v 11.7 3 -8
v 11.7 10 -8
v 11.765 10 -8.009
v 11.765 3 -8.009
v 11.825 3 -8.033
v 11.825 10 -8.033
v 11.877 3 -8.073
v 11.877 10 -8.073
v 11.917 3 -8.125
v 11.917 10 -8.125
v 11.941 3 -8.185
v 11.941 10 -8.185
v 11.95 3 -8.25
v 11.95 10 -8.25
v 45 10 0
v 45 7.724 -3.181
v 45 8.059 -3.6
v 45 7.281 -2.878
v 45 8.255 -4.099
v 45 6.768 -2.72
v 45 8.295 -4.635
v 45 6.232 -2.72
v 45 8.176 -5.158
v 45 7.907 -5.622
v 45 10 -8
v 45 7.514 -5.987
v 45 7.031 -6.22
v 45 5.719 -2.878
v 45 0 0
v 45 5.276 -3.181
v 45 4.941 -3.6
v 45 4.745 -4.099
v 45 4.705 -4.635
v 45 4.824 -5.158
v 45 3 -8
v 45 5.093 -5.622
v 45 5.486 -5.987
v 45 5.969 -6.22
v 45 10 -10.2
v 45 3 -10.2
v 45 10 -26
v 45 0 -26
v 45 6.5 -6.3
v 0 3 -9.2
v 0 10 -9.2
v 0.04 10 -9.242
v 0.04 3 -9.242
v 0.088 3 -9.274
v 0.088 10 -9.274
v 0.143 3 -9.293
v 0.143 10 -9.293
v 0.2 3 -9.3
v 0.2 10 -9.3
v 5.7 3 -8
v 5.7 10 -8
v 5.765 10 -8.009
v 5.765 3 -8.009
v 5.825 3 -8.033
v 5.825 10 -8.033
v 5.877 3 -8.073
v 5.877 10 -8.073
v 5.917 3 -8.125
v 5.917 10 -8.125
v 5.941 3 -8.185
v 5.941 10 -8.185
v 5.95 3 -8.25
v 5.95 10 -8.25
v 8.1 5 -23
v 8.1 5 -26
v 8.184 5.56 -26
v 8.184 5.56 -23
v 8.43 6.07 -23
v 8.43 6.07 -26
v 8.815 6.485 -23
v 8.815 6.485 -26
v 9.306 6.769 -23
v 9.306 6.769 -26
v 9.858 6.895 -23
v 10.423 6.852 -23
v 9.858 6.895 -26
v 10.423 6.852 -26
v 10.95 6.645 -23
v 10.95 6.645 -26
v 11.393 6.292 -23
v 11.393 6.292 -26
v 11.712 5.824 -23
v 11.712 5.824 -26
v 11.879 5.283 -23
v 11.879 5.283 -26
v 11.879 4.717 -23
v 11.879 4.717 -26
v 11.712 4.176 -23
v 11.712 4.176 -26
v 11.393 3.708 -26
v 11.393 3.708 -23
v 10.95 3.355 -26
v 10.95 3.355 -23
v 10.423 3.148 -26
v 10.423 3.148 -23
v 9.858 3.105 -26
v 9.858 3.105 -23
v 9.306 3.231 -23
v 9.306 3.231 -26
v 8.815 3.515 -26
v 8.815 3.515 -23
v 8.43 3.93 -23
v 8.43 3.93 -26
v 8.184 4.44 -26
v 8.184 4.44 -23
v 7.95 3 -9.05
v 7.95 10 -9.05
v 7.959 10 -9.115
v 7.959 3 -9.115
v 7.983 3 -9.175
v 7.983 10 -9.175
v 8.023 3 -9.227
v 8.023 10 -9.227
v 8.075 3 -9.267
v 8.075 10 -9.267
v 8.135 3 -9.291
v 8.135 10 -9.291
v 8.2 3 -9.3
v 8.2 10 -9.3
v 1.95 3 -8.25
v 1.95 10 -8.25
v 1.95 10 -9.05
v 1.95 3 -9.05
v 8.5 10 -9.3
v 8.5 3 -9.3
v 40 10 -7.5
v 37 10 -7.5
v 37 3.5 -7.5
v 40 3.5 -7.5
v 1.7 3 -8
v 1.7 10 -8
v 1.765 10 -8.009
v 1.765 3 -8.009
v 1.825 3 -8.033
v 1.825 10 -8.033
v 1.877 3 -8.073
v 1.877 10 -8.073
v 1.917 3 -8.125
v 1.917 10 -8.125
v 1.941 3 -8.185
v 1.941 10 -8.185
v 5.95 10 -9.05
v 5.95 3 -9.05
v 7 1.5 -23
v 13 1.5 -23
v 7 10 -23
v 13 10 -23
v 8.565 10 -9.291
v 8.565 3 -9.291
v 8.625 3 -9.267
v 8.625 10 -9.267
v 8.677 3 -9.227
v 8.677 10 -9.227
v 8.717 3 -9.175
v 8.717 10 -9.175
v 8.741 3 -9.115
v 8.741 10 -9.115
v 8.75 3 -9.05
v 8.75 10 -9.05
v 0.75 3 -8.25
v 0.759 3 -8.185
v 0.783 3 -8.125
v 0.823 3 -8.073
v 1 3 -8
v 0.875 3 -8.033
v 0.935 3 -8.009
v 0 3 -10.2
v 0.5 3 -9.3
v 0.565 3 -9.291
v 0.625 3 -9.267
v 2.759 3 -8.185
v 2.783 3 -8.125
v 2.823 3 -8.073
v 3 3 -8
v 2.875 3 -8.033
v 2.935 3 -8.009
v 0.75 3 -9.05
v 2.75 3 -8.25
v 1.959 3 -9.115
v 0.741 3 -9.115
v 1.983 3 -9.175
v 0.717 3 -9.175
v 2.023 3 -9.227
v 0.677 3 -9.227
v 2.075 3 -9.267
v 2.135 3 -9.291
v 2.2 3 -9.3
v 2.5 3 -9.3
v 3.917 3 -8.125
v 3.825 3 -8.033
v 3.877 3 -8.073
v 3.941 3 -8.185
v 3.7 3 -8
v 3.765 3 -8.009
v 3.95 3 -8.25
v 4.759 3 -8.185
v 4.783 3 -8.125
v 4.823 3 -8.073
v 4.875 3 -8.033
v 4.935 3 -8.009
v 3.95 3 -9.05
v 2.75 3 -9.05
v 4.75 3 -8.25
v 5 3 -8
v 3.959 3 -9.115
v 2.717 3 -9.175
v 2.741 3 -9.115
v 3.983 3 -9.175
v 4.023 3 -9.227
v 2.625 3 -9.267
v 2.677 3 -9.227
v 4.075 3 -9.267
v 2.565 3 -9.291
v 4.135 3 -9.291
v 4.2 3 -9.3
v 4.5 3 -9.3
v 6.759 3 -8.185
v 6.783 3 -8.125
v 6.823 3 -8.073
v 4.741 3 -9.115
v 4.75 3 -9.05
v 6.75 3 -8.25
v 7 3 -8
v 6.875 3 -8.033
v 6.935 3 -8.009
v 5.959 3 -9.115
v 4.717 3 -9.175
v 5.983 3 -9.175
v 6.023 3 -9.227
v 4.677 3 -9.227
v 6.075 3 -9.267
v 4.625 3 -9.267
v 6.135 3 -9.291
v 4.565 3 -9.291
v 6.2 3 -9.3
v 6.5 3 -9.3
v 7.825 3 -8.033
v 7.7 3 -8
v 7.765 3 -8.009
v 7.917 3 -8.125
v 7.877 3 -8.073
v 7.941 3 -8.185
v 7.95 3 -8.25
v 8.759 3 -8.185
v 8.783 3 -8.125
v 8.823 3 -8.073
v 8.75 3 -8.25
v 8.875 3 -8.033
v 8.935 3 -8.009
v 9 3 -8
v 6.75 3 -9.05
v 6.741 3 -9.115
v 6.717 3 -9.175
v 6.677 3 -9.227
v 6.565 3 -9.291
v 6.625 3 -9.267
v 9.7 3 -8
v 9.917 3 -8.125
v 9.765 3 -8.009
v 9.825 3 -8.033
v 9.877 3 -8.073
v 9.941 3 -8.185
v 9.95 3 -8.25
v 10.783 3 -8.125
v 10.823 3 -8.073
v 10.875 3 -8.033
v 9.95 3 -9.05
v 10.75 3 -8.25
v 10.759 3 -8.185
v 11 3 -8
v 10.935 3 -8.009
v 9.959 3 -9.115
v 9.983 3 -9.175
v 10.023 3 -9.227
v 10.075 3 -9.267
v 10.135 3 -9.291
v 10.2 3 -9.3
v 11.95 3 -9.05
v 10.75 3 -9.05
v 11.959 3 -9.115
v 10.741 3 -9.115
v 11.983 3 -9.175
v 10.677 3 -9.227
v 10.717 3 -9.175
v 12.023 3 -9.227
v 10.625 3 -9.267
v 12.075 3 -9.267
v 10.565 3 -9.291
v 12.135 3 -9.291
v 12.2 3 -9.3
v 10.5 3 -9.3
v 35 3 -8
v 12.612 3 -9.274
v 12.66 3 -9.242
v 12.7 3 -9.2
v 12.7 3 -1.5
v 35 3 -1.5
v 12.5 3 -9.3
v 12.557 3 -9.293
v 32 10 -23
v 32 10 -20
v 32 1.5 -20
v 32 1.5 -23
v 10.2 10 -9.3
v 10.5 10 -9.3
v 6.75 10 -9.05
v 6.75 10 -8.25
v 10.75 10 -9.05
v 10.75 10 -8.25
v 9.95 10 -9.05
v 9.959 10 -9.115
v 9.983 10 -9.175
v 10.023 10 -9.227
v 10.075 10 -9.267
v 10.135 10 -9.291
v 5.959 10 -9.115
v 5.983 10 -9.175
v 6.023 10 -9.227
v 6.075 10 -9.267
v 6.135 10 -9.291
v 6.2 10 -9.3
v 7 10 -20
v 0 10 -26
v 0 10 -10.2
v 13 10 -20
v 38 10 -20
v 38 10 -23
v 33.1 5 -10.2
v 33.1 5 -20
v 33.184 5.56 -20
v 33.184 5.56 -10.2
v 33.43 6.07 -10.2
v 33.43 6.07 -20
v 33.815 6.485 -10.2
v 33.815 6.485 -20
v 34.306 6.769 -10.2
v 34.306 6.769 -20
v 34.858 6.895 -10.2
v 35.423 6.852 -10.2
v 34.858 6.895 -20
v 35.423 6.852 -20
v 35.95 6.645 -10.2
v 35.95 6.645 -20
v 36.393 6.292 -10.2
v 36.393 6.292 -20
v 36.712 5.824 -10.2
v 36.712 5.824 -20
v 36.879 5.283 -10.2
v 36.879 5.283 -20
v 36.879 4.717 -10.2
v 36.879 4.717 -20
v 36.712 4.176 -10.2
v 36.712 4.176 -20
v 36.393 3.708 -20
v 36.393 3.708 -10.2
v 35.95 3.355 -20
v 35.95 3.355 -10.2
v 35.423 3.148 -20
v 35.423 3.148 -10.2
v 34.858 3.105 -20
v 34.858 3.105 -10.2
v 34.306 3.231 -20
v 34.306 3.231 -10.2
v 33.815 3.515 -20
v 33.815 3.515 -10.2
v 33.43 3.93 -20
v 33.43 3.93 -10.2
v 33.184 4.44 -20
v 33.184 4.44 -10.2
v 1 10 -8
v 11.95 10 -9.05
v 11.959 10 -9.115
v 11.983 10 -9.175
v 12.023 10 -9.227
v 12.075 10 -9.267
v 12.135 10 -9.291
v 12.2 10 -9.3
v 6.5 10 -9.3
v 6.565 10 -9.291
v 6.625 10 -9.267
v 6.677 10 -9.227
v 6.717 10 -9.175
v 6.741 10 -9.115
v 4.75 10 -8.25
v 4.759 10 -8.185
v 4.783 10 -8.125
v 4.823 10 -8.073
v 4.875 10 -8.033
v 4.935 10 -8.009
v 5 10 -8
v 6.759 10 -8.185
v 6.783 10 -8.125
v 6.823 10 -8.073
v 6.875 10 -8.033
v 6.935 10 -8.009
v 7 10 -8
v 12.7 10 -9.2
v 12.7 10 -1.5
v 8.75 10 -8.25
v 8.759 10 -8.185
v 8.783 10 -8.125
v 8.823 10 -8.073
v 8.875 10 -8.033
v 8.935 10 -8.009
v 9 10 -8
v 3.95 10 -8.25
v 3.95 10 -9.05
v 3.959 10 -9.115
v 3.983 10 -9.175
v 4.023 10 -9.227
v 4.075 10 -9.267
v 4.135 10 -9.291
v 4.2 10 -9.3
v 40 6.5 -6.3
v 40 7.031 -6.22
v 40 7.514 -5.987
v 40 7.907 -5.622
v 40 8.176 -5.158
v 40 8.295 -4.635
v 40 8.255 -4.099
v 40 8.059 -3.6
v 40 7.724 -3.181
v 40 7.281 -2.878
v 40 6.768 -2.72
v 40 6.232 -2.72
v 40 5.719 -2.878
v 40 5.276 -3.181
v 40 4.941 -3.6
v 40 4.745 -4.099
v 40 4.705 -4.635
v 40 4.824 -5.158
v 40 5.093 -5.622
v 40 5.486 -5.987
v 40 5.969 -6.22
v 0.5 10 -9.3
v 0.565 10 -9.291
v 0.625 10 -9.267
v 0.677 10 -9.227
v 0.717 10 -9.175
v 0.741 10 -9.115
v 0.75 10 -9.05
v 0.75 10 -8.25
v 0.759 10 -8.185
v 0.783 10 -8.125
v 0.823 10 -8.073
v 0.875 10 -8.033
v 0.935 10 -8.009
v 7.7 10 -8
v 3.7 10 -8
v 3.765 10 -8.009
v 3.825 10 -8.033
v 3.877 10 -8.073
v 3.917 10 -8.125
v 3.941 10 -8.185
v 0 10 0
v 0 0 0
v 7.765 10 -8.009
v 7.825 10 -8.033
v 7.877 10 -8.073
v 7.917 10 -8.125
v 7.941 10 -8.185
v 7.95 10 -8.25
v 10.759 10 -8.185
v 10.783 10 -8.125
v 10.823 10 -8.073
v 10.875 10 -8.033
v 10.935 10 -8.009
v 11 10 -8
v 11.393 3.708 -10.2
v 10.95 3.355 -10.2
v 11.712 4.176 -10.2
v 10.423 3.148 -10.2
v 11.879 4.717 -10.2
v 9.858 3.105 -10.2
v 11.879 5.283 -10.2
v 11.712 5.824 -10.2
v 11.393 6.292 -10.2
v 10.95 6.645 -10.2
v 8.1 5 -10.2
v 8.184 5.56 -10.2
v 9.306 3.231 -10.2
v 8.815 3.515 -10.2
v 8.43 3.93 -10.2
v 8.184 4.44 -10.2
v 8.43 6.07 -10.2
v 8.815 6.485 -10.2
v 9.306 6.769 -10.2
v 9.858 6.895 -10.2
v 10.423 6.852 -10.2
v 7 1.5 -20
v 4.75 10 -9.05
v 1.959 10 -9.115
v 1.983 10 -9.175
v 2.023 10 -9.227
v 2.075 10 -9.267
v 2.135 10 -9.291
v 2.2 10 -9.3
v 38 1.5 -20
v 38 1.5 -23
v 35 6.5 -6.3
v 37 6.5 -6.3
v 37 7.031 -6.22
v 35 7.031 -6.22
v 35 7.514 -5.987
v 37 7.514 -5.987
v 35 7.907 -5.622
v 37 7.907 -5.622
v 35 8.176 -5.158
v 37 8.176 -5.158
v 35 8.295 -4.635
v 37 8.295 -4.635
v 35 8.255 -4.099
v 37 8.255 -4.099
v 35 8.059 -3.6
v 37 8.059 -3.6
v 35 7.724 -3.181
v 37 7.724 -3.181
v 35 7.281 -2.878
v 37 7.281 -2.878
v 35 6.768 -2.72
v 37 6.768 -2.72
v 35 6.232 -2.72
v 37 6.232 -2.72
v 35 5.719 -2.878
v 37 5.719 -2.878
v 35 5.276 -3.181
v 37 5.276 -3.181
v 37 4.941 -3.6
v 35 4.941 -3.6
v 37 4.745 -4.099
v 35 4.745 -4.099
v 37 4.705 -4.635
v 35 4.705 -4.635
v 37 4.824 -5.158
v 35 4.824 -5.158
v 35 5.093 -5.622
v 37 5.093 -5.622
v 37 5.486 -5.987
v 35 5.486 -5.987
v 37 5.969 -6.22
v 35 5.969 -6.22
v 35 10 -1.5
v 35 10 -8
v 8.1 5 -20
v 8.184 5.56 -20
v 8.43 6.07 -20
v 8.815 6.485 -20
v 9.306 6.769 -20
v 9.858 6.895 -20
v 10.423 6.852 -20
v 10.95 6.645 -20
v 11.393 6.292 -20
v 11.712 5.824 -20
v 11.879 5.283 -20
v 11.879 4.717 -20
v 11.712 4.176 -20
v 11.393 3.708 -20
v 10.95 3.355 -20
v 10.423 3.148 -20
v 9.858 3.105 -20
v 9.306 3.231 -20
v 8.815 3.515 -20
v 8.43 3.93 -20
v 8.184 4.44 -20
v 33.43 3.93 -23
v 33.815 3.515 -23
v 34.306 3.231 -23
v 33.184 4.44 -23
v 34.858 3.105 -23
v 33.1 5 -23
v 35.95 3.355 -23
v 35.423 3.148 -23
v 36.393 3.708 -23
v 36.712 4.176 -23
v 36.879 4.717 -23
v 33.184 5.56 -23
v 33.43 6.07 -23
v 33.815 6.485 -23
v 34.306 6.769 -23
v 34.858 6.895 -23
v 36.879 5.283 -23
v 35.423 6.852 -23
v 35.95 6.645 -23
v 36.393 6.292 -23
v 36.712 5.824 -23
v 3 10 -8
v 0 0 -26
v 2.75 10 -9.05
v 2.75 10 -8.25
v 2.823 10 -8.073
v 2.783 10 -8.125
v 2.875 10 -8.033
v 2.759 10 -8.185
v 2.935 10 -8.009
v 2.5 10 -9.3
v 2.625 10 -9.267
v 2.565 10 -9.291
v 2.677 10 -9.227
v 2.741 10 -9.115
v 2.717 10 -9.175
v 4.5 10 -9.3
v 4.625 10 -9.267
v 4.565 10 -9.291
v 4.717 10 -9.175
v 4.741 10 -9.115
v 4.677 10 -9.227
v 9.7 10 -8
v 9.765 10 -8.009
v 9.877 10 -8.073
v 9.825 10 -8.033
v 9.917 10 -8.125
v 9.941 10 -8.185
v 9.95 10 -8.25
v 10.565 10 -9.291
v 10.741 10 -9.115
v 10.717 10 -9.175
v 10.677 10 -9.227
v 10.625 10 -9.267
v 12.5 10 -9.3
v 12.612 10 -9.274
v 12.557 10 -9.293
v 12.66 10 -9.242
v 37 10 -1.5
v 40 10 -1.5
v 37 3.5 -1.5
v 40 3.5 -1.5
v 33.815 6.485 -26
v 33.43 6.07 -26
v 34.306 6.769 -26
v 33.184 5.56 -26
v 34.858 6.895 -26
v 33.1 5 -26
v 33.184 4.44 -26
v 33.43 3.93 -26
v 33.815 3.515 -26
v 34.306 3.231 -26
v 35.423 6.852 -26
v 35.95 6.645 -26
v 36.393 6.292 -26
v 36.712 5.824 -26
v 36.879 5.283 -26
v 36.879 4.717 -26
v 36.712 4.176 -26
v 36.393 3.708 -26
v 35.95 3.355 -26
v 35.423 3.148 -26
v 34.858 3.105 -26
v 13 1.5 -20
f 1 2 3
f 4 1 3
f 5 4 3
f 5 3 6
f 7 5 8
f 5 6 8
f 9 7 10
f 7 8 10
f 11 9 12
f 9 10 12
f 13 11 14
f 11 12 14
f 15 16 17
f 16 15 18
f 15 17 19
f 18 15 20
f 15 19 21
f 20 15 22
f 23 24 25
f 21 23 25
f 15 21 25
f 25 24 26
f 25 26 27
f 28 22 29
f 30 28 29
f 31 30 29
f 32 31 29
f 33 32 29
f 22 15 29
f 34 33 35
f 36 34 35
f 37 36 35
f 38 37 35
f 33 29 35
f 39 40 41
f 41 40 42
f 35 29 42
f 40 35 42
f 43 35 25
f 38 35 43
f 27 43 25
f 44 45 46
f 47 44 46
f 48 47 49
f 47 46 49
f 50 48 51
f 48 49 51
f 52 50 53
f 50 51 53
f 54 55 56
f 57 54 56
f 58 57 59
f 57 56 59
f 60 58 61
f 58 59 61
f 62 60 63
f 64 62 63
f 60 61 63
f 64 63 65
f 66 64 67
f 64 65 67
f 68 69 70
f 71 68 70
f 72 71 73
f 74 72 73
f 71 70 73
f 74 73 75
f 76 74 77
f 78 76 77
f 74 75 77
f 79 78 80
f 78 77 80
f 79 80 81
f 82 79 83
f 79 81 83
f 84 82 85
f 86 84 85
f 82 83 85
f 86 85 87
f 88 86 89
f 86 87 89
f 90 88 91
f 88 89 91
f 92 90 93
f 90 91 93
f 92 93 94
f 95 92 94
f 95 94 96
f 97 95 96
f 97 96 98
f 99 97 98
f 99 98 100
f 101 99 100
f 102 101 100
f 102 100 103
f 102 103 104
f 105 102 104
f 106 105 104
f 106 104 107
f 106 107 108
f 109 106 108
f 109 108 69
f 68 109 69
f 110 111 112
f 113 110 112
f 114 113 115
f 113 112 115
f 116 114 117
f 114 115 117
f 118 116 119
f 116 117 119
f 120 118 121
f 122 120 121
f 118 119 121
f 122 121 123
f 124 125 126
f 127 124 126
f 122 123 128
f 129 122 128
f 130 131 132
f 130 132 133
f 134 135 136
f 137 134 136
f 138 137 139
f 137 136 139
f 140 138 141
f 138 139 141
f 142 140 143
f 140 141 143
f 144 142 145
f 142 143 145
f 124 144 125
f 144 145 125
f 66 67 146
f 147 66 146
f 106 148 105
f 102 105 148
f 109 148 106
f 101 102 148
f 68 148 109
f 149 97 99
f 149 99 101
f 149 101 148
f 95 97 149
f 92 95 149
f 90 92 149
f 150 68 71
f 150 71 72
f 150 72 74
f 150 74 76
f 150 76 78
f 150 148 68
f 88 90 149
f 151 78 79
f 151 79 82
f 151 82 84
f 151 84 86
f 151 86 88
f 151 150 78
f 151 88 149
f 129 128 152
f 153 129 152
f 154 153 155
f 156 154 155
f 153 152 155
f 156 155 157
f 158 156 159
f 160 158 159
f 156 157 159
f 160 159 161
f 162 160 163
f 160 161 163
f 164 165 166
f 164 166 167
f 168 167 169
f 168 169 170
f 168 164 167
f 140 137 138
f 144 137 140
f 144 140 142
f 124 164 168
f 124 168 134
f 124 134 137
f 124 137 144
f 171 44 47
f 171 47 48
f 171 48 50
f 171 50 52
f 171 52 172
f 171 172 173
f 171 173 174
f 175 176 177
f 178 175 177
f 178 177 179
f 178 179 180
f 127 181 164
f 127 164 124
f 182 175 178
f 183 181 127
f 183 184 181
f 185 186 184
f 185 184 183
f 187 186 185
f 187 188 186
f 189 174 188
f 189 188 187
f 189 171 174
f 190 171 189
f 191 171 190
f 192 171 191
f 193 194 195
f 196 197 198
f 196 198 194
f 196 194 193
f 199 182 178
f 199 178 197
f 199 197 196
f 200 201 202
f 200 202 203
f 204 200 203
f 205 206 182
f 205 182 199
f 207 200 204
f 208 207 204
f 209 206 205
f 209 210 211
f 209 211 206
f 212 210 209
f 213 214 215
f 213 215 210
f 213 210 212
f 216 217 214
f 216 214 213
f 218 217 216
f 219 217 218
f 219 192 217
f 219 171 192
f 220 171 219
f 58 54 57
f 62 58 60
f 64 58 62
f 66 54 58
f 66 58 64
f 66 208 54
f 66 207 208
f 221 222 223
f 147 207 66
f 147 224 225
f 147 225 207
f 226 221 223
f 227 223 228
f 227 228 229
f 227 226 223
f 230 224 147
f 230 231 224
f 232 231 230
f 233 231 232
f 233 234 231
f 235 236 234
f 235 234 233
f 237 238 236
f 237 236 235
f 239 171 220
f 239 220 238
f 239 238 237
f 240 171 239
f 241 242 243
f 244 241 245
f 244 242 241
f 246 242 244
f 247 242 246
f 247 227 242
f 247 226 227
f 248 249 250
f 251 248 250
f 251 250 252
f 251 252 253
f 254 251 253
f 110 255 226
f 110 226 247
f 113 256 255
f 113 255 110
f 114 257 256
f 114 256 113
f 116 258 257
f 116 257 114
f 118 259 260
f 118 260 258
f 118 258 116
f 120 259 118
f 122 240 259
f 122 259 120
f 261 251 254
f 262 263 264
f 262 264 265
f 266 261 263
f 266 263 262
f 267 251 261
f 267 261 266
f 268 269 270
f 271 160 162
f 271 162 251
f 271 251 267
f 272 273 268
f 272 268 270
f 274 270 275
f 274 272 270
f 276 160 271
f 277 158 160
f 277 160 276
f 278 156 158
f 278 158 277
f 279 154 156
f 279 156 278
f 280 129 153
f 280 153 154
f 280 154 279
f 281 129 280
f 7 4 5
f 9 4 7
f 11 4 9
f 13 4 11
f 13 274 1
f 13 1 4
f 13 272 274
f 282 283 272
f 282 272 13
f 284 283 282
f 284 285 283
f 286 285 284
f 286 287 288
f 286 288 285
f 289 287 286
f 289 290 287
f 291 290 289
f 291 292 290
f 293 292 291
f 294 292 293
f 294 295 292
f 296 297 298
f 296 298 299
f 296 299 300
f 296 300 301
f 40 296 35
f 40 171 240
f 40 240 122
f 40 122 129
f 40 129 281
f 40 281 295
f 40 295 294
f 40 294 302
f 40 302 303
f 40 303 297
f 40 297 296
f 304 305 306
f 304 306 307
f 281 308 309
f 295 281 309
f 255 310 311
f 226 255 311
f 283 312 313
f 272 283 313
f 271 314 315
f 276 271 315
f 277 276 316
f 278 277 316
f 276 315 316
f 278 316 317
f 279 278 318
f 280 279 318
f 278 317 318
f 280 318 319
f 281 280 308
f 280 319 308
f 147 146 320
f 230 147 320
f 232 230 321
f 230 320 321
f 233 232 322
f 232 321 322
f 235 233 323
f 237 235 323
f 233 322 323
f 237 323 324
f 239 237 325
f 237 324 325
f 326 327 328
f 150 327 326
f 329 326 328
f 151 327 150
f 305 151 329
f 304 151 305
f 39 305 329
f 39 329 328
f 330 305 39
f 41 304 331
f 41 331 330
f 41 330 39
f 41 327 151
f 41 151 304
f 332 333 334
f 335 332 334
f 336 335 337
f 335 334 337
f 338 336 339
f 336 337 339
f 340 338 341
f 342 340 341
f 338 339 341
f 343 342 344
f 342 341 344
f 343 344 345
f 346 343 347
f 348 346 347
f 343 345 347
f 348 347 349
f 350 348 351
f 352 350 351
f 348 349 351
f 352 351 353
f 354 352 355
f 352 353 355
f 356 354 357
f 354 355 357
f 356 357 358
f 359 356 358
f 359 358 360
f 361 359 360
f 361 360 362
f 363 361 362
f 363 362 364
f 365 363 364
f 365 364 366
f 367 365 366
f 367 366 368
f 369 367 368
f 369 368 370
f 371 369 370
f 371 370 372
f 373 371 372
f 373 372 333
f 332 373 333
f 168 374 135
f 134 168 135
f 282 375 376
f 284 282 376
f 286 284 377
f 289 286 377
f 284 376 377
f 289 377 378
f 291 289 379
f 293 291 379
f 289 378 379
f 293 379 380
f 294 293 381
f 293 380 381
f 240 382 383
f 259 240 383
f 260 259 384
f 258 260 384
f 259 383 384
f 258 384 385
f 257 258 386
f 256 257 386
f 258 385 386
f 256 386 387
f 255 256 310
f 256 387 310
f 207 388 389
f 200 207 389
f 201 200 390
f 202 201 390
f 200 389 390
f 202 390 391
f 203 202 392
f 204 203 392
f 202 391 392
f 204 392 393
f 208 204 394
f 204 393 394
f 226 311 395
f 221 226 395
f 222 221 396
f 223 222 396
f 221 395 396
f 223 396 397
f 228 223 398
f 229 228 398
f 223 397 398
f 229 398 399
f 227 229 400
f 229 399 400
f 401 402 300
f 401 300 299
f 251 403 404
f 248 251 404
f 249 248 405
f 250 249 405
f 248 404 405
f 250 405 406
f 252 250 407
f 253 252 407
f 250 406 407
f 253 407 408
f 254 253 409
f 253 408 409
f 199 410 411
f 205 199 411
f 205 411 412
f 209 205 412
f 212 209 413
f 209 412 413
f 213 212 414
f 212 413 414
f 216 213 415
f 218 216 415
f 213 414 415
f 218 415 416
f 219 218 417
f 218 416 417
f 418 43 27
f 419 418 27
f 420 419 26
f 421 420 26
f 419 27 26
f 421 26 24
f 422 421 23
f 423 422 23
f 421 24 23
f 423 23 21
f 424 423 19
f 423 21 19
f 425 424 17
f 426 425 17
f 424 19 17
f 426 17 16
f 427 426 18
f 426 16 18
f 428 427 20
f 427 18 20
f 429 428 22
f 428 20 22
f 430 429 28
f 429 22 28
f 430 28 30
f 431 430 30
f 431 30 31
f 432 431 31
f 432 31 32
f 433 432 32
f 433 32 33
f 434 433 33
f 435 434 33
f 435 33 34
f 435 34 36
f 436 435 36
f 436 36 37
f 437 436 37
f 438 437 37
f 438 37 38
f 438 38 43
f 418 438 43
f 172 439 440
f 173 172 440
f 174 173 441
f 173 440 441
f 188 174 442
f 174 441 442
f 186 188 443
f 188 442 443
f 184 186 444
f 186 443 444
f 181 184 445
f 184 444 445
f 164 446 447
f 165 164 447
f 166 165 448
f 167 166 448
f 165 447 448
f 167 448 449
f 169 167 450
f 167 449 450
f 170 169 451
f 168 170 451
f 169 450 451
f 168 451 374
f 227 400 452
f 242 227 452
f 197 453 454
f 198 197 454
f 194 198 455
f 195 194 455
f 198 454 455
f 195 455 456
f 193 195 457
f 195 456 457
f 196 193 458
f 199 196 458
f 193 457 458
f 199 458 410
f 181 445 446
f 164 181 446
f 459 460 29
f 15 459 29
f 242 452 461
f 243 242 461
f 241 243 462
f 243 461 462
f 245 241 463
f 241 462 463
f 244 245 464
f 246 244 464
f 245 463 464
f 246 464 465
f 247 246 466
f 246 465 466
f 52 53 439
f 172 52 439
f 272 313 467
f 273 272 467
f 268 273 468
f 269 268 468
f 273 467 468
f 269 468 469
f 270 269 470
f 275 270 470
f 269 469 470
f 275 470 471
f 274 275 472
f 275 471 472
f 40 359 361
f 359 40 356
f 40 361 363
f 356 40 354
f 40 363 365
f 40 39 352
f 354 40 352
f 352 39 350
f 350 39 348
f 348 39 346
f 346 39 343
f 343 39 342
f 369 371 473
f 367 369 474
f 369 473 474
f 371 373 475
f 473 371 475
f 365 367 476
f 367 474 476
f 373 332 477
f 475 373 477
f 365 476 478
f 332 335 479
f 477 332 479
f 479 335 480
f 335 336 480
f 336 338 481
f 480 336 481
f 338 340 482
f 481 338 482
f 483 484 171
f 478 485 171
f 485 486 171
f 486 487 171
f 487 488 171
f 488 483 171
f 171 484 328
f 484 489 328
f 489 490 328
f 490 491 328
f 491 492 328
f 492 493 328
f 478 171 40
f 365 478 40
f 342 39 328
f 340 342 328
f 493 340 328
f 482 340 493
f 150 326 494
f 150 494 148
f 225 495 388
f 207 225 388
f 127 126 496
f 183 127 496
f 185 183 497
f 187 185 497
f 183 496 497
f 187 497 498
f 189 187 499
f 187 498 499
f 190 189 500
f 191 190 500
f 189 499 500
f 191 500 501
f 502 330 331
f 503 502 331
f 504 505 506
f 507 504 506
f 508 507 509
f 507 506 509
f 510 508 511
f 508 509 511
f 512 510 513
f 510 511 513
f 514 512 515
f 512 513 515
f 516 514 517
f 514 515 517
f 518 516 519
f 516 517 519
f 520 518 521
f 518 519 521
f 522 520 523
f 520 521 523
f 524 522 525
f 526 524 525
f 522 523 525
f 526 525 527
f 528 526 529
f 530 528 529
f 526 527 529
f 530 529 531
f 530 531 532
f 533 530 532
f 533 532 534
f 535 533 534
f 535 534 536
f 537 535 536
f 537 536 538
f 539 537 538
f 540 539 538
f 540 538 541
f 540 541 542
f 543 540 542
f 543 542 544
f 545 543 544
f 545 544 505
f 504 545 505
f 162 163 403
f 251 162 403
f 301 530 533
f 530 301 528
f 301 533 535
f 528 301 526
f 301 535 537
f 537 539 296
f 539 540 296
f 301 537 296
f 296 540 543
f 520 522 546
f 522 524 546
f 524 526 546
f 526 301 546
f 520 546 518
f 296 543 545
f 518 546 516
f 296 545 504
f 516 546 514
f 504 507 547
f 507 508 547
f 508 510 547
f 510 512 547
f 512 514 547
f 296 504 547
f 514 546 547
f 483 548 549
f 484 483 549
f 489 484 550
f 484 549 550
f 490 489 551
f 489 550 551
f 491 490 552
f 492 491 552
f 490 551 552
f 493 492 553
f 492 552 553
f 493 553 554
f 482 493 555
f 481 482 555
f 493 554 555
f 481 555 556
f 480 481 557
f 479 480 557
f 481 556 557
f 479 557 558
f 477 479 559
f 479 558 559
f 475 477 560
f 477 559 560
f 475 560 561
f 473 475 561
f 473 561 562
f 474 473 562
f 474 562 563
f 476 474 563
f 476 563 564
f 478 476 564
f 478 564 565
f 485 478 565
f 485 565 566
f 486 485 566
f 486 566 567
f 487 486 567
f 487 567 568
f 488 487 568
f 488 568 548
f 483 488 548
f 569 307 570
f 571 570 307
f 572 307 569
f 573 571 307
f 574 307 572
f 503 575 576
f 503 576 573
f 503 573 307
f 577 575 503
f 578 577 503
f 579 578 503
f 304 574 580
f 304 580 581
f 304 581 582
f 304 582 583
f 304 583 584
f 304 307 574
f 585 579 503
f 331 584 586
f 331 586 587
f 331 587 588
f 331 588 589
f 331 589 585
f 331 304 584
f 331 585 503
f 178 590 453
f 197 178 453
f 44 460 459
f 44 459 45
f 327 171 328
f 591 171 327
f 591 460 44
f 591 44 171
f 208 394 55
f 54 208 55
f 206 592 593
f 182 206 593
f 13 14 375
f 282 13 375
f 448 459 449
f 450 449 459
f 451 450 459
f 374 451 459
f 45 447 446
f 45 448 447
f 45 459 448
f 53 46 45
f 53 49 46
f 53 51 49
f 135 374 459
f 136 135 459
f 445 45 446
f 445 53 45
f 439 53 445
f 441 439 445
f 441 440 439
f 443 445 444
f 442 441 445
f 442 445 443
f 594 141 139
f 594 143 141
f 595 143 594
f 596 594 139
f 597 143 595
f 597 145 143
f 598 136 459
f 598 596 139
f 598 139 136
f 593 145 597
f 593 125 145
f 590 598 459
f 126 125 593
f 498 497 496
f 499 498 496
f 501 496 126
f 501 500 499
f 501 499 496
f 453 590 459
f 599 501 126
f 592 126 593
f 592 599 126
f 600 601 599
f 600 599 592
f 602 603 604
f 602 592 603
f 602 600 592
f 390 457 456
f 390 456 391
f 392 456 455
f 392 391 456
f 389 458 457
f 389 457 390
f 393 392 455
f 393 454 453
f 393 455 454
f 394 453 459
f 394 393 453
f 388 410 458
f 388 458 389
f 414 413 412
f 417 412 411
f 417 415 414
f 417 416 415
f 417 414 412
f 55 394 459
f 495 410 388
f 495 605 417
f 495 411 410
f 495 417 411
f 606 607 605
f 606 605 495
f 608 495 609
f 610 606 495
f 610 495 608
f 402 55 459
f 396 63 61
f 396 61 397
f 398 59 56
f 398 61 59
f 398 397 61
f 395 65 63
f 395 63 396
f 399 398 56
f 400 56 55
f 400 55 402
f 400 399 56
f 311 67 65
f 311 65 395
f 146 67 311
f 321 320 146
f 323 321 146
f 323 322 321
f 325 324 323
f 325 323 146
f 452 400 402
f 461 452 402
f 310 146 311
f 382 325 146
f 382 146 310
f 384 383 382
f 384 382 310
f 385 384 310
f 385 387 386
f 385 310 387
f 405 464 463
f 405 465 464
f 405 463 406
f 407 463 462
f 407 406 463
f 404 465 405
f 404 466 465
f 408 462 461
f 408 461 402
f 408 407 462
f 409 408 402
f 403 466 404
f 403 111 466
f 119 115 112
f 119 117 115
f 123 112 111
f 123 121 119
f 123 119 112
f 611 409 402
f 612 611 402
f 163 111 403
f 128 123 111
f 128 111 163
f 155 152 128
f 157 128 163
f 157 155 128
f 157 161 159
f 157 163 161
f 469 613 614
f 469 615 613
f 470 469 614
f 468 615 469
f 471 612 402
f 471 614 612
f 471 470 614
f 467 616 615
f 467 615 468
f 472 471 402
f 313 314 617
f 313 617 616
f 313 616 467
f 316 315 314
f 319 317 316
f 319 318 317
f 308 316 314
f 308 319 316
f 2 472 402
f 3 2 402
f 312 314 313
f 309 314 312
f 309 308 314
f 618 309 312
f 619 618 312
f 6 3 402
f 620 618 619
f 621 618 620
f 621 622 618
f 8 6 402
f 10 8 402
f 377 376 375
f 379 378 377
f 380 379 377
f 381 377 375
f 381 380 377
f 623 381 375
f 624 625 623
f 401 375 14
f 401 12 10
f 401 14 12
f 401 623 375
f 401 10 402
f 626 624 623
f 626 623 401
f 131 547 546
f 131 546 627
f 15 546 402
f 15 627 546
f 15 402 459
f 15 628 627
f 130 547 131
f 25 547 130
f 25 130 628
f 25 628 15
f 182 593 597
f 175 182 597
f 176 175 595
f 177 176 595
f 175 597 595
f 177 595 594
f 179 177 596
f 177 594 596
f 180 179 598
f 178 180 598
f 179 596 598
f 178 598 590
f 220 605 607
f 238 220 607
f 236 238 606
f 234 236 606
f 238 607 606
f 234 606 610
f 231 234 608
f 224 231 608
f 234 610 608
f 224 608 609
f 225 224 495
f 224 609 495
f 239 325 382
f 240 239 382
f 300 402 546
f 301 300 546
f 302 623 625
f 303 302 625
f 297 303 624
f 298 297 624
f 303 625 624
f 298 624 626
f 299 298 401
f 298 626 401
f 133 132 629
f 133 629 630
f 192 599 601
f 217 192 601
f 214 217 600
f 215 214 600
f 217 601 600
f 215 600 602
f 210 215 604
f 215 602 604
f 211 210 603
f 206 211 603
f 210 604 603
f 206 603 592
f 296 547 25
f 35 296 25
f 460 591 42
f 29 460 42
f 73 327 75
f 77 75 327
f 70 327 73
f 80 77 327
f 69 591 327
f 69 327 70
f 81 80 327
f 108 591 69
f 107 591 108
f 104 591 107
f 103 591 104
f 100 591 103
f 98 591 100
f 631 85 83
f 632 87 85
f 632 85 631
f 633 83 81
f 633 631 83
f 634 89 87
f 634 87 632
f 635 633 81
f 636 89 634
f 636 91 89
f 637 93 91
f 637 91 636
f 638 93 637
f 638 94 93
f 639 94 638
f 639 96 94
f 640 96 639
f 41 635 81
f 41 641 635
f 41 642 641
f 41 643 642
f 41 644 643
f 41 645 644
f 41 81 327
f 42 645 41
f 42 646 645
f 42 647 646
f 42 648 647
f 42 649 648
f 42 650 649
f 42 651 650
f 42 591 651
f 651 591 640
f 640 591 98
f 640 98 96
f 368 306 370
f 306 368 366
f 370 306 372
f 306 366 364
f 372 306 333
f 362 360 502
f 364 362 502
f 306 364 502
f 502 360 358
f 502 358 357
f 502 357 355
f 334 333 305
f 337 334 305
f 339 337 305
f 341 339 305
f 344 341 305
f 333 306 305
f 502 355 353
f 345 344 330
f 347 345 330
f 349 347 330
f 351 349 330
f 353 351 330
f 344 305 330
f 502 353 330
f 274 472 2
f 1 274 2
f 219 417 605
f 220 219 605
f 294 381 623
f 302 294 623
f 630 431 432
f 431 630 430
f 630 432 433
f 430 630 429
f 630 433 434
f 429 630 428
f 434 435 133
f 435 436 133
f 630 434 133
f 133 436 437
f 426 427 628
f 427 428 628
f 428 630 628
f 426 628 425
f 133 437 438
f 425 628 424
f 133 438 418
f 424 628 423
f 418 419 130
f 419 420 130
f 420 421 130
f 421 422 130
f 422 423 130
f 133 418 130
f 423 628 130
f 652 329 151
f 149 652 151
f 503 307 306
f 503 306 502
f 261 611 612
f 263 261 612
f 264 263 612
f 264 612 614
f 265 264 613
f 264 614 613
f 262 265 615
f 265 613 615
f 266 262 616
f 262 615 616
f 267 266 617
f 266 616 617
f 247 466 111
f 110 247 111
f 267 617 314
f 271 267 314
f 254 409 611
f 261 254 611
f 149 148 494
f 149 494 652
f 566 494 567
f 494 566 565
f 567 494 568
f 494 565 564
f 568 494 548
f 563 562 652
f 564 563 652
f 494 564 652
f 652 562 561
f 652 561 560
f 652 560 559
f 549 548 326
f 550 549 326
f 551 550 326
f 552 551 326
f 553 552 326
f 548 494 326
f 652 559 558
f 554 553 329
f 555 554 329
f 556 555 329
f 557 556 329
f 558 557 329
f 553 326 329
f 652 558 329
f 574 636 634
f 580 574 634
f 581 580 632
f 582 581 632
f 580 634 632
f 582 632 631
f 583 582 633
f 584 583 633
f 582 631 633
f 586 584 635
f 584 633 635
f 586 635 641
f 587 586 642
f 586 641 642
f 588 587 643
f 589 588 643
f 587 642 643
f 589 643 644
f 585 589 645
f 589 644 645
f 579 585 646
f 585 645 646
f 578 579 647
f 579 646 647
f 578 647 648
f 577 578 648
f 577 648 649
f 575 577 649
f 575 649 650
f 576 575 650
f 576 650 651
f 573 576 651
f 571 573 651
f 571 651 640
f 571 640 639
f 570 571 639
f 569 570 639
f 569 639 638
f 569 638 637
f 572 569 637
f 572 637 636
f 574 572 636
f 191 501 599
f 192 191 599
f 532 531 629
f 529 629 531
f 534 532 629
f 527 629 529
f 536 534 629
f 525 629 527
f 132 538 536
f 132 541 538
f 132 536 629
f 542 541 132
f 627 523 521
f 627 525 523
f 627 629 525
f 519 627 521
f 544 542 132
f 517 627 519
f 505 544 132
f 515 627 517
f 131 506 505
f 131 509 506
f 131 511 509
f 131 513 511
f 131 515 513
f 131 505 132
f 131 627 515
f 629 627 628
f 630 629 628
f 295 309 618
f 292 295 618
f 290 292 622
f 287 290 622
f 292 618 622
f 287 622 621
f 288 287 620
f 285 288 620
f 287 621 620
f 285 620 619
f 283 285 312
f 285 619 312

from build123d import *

# Parameters (mm, degrees)
SKETCH_1_W          = 45
SKETCH_1_H          = 26
EXTRUDE_1_DEPTH     = 10
CUT_EXTRUDE_1_DEPTH = 7
SKETCH_4_W          = 30
SKETCH_4_H          = 1.4
CUT_EXTRUDE_3_DEPTH = 7
SKETCH_5_R          = 1.8
CUT_EXTRUDE_4_DEPTH = 30
SKETCH_6_W          = 3
SKETCH_6_H          = 6
CUT_EXTRUDE_5_DEPTH = 6.5
SKETCH_7_W          = 22.3
SKETCH_7_H          = 8.113029467
CUT_EXTRUDE_7_DEPTH = 7
SKETCH_8_R          = 1.9
CUT_EXTRUDE_8_DEPTH = 15.9
SKETCH_10_W         = 6
SKETCH_10_H         = 3
CUT_EXTRUDE_9_DEPTH = 8.5


with BuildPart() as part:
    # 草图1 → 凸台-拉伸1 (new body)
    with BuildSketch(Plane(origin=(0, 0, 0), x_dir=(1, 0, 0), z_dir=(0, 1, 0))):
        with Locations((22.5, 13)):
            Rectangle(SKETCH_1_W, SKETCH_1_H)
    extrude(amount=EXTRUDE_1_DEPTH)

    # 草图3 → 切除-拉伸1 (cut)
    with BuildSketch(Plane(origin=(0, 10, 0), x_dir=(1, 0, 0), z_dir=(0, 1, 0))):
        with BuildLine():
            Line((43, 8), (43.7, 8))
            ThreePointArc((43.7, 8), (43.876776695, 8.073223305), (43.95, 8.25))
            Line((43.95, 8.25), (43.95, 9.05))
            ThreePointArc((43.95, 9.05), (44.023223305, 9.226776695), (44.2, 9.3))
            Line((44.2, 9.3), (44.5, 9.3))
            ThreePointArc((44.5, 9.3), (44.676776695, 9.226776695), (44.75, 9.05))
            Line((44.75, 9.05), (44.75, 8.25))
            ThreePointArc((44.75, 8.25), (44.823223305, 8.073223305), (45, 8))
            Line((45, 8), (45, 10.2))
            Line((45, 10.2), (0, 10.2))
            Line((0, 10.2), (0, 9.2))
            ThreePointArc((0, 9.2), (0.088196601, 9.273606798), (0.2, 9.3))
            Line((0.2, 9.3), (0.5, 9.3))
            ThreePointArc((0.5, 9.3), (0.676776695, 9.226776695), (0.75, 9.05))
            Line((0.75, 9.05), (0.75, 8.25))
            ThreePointArc((0.75, 8.25), (0.823223305, 8.073223305), (1, 8))
            Line((1, 8), (1.7, 8))
            ThreePointArc((1.7, 8), (1.876776695, 8.073223305), (1.95, 8.25))
            Line((1.95, 8.25), (1.95, 9.05))
            ThreePointArc((1.95, 9.05), (2.023223305, 9.226776695), (2.2, 9.3))
            Line((2.2, 9.3), (2.5, 9.3))
            ThreePointArc((2.5, 9.3), (2.676776695, 9.226776695), (2.75, 9.05))
            Line((2.75, 9.05), (2.75, 8.25))
            ThreePointArc((2.75, 8.25), (2.823223305, 8.073223305), (3, 8))
            Line((3, 8), (3.7, 8))
            ThreePointArc((3.7, 8), (3.876776695, 8.073223305), (3.95, 8.25))
            Line((3.95, 8.25), (3.95, 9.05))
            ThreePointArc((3.95, 9.05), (4.023223305, 9.226776695), (4.2, 9.3))
            Line((4.2, 9.3), (4.5, 9.3))
            ThreePointArc((4.5, 9.3), (4.676776695, 9.226776695), (4.75, 9.05))
            Line((4.75, 9.05), (4.75, 8.25))
            ThreePointArc((4.75, 8.25), (4.823223305, 8.073223305), (5, 8))
            Line((5, 8), (5.7, 8))
            ThreePointArc((5.7, 8), (5.876776695, 8.073223305), (5.95, 8.25))
            Line((5.95, 8.25), (5.95, 9.05))
            ThreePointArc((5.95, 9.05), (6.023223305, 9.226776695), (6.2, 9.3))
            Line((6.2, 9.3), (6.5, 9.3))
            ThreePointArc((6.5, 9.3), (6.676776695, 9.226776695), (6.75, 9.05))
            Line((6.75, 9.05), (6.75, 8.25))
            ThreePointArc((6.75, 8.25), (6.823223305, 8.073223305), (7, 8))
            Line((7, 8), (7.7, 8))
            ThreePointArc((7.7, 8), (7.876776695, 8.073223305), (7.95, 8.25))
            Line((7.95, 8.25), (7.95, 9.05))
            ThreePointArc((7.95, 9.05), (8.023223305, 9.226776695), (8.2, 9.3))
            Line((8.2, 9.3), (8.5, 9.3))
            ThreePointArc((8.5, 9.3), (8.676776695, 9.226776695), (8.75, 9.05))
            Line((8.75, 9.05), (8.75, 8.25))
            ThreePointArc((8.75, 8.25), (8.823223305, 8.073223305), (9, 8))
            Line((9, 8), (9.7, 8))
            ThreePointArc((9.7, 8), (9.876776695, 8.073223305), (9.95, 8.25))
            Line((9.95, 8.25), (9.95, 9.05))
            ThreePointArc((9.95, 9.05), (10.023223305, 9.226776695), (10.2, 9.3))
            Line((10.2, 9.3), (10.5, 9.3))
            ThreePointArc((10.5, 9.3), (10.676776695, 9.226776695), (10.75, 9.05))
            Line((10.75, 9.05), (10.75, 8.25))
            ThreePointArc((10.75, 8.25), (10.823223305, 8.073223305), (11, 8))
            Line((11, 8), (11.7, 8))
            ThreePointArc((11.7, 8), (11.876776695, 8.073223305), (11.95, 8.25))
            Line((11.95, 8.25), (11.95, 9.05))
            ThreePointArc((11.95, 9.05), (12.023223305, 9.226776695), (12.2, 9.3))
            Line((12.2, 9.3), (12.5, 9.3))
            ThreePointArc((12.5, 9.3), (12.676776695, 9.226776695), (12.75, 9.05))
            Line((12.75, 9.05), (12.75, 8.25))
            ThreePointArc((12.75, 8.25), (12.823223305, 8.073223305), (13, 8))
            Line((13, 8), (13.7, 8))
            ThreePointArc((13.7, 8), (13.876776695, 8.073223305), (13.95, 8.25))
            Line((13.95, 8.25), (13.95, 9.05))
            ThreePointArc((13.95, 9.05), (14.023223305, 9.226776695), (14.2, 9.3))
            Line((14.2, 9.3), (14.5, 9.3))
            ThreePointArc((14.5, 9.3), (14.676776695, 9.226776695), (14.75, 9.05))
            Line((14.75, 9.05), (14.75, 8.25))
            ThreePointArc((14.75, 8.25), (14.823223305, 8.073223305), (15, 8))
            Line((15, 8), (15.7, 8))
            ThreePointArc((15.7, 8), (15.876776695, 8.073223305), (15.95, 8.25))
            Line((15.95, 8.25), (15.95, 9.05))
            ThreePointArc((15.95, 9.05), (16.023223305, 9.226776695), (16.2, 9.3))
            Line((16.2, 9.3), (16.5, 9.3))
            ThreePointArc((16.5, 9.3), (16.676776695, 9.226776695), (16.75, 9.05))
            Line((16.75, 9.05), (16.75, 8.25))
            ThreePointArc((16.75, 8.25), (16.823223305, 8.073223305), (17, 8))
            Line((17, 8), (17.7, 8))
            ThreePointArc((17.7, 8), (17.876776695, 8.073223305), (17.95, 8.25))
            Line((17.95, 8.25), (17.95, 9.05))
            ThreePointArc((17.95, 9.05), (18.023223305, 9.226776695), (18.2, 9.3))
            Line((18.2, 9.3), (18.5, 9.3))
            ThreePointArc((18.5, 9.3), (18.676776695, 9.226776695), (18.75, 9.05))
            Line((18.75, 9.05), (18.75, 8.25))
            ThreePointArc((18.75, 8.25), (18.823223305, 8.073223305), (19, 8))
            Line((19, 8), (19.7, 8))
            ThreePointArc((19.7, 8), (19.876776695, 8.073223305), (19.95, 8.25))
            Line((19.95, 8.25), (19.95, 9.05))
            ThreePointArc((19.95, 9.05), (20.023223305, 9.226776695), (20.2, 9.3))
            Line((20.2, 9.3), (20.5, 9.3))
            ThreePointArc((20.5, 9.3), (20.676776695, 9.226776695), (20.75, 9.05))
            Line((20.75, 9.05), (20.75, 8.25))
            ThreePointArc((20.75, 8.25), (20.823223305, 8.073223305), (21, 8))
            Line((21, 8), (21.7, 8))
            ThreePointArc((21.7, 8), (21.876776695, 8.073223305), (21.95, 8.25))
            Line((21.95, 8.25), (21.95, 9.05))
            ThreePointArc((21.95, 9.05), (22.023223305, 9.226776695), (22.2, 9.3))
            Line((22.2, 9.3), (22.5, 9.3))
            ThreePointArc((22.5, 9.3), (22.676776695, 9.226776695), (22.75, 9.05))
            Line((22.75, 9.05), (22.75, 8.25))
            ThreePointArc((22.75, 8.25), (22.823223305, 8.073223305), (23, 8))
            Line((23, 8), (23.7, 8))
            ThreePointArc((23.7, 8), (23.876776695, 8.073223305), (23.95, 8.25))
            Line((23.95, 8.25), (23.95, 9.05))
            ThreePointArc((23.95, 9.05), (24.023223305, 9.226776695), (24.2, 9.3))
            Line((24.2, 9.3), (24.5, 9.3))
            ThreePointArc((24.5, 9.3), (24.676776695, 9.226776695), (24.75, 9.05))
            Line((24.75, 9.05), (24.75, 8.25))
            ThreePointArc((24.75, 8.25), (24.823223305, 8.073223305), (25, 8))
            Line((25, 8), (25.7, 8))
            ThreePointArc((25.7, 8), (25.876776695, 8.073223305), (25.95, 8.25))
            Line((25.95, 8.25), (25.95, 9.05))
            ThreePointArc((25.95, 9.05), (26.023223305, 9.226776695), (26.2, 9.3))
            Line((26.2, 9.3), (26.5, 9.3))
            ThreePointArc((26.5, 9.3), (26.676776695, 9.226776695), (26.75, 9.05))
            Line((26.75, 9.05), (26.75, 8.25))
            ThreePointArc((26.75, 8.25), (26.823223305, 8.073223305), (27, 8))
            Line((27, 8), (27.7, 8))
            ThreePointArc((27.7, 8), (27.876776695, 8.073223305), (27.95, 8.25))
            Line((27.95, 8.25), (27.95, 9.05))
            ThreePointArc((27.95, 9.05), (28.023223305, 9.226776695), (28.2, 9.3))
            Line((28.2, 9.3), (28.5, 9.3))
            ThreePointArc((28.5, 9.3), (28.676776695, 9.226776695), (28.75, 9.05))
            Line((28.75, 9.05), (28.75, 8.25))
            ThreePointArc((28.75, 8.25), (28.823223305, 8.073223305), (29, 8))
            Line((29, 8), (29.7, 8))
            ThreePointArc((29.7, 8), (29.876776695, 8.073223305), (29.95, 8.25))
            Line((29.95, 8.25), (29.95, 9.05))
            ThreePointArc((29.95, 9.05), (30.023223305, 9.226776695), (30.2, 9.3))
            Line((30.2, 9.3), (30.5, 9.3))
            ThreePointArc((30.5, 9.3), (30.676776695, 9.226776695), (30.75, 9.05))
            Line((30.75, 9.05), (30.75, 8.25))
            ThreePointArc((30.75, 8.25), (30.823223305, 8.073223305), (31, 8))
            Line((31, 8), (31.7, 8))
            ThreePointArc((31.7, 8), (31.876776695, 8.073223305), (31.95, 8.25))
            Line((31.95, 8.25), (31.95, 9.05))
            ThreePointArc((31.95, 9.05), (32.023223305, 9.226776695), (32.2, 9.3))
            Line((32.2, 9.3), (32.5, 9.3))
            ThreePointArc((32.5, 9.3), (32.676776695, 9.226776695), (32.75, 9.05))
            Line((32.75, 9.05), (32.75, 8.25))
            ThreePointArc((32.75, 8.25), (32.823223305, 8.073223305), (33, 8))
            Line((33, 8), (33.7, 8))
            ThreePointArc((33.7, 8), (33.876776695, 8.073223305), (33.95, 8.25))
            Line((33.95, 8.25), (33.95, 9.05))
            ThreePointArc((33.95, 9.05), (34.023223305, 9.226776695), (34.2, 9.3))
            Line((34.2, 9.3), (34.5, 9.3))
            ThreePointArc((34.5, 9.3), (34.676776695, 9.226776695), (34.75, 9.05))
            Line((34.75, 9.05), (34.75, 8.25))
            ThreePointArc((34.75, 8.25), (34.823223305, 8.073223305), (35, 8))
            Line((35, 8), (35.7, 8))
            ThreePointArc((35.7, 8), (35.876776695, 8.073223305), (35.95, 8.25))
            Line((35.95, 8.25), (35.95, 9.05))
            ThreePointArc((35.95, 9.05), (36.023223305, 9.226776695), (36.2, 9.3))
            Line((36.2, 9.3), (36.5, 9.3))
            ThreePointArc((36.5, 9.3), (36.676776695, 9.226776695), (36.75, 9.05))
            Line((36.75, 9.05), (36.75, 8.25))
            ThreePointArc((36.75, 8.25), (36.823223305, 8.073223305), (37, 8))
            Line((37, 8), (37.7, 8))
            ThreePointArc((37.7, 8), (37.876776695, 8.073223305), (37.95, 8.25))
            Line((37.95, 8.25), (37.95, 9.05))
            ThreePointArc((37.95, 9.05), (38.023223305, 9.226776695), (38.2, 9.3))
            Line((38.2, 9.3), (38.5, 9.3))
            ThreePointArc((38.5, 9.3), (38.676776695, 9.226776695), (38.75, 9.05))
            Line((38.75, 9.05), (38.75, 8.25))
            ThreePointArc((38.75, 8.25), (38.823223305, 8.073223305), (39, 8))
            Line((39, 8), (39.7, 8))
            ThreePointArc((39.7, 8), (39.876776695, 8.073223305), (39.95, 8.25))
            Line((39.95, 8.25), (39.95, 9.05))
            ThreePointArc((39.95, 9.05), (40.023223305, 9.226776695), (40.2, 9.3))
            Line((40.2, 9.3), (40.5, 9.3))
            ThreePointArc((40.5, 9.3), (40.676776695, 9.226776695), (40.75, 9.05))
            Line((40.75, 9.05), (40.75, 8.25))
            ThreePointArc((40.75, 8.25), (40.823223305, 8.073223305), (41, 8))
            Line((41, 8), (41.7, 8))
            ThreePointArc((41.7, 8), (41.876776695, 8.073223305), (41.95, 8.25))
            Line((41.95, 8.25), (41.95, 9.05))
            ThreePointArc((41.95, 9.05), (42.023223305, 9.226776695), (42.2, 9.3))
            Line((42.2, 9.3), (42.5, 9.3))
            ThreePointArc((42.5, 9.3), (42.676776695, 9.226776695), (42.75, 9.05))
            Line((42.75, 9.05), (42.75, 8.25))
            ThreePointArc((42.75, 8.25), (42.823223305, 8.073223305), (43, 8))
        make_face()
    extrude(amount=-CUT_EXTRUDE_1_DEPTH, mode=Mode.SUBTRACT)

    # 草图4 → 切除-拉伸3 (cut)
    with BuildSketch(Plane(origin=(0, 10, 0), x_dir=(1, 0, 0), z_dir=(0, 1, 0))):
        with Locations((30, 8.7)):
            Rectangle(SKETCH_4_W, SKETCH_4_H)
    extrude(amount=-CUT_EXTRUDE_3_DEPTH, mode=Mode.SUBTRACT)

    # 草图5 → 切除-拉伸4 (cut)
    with BuildSketch(Plane(origin=(45, 0, 0), x_dir=(0, 0, -1), z_dir=(1, 0, 0))):
        with Locations((4.5, 6.5)):
            Circle(SKETCH_5_R)
    extrude(amount=-CUT_EXTRUDE_4_DEPTH, mode=Mode.SUBTRACT)

    # 草图6 → 切除-拉伸5 (cut)
    with BuildSketch(Plane(origin=(0, 10, 0), x_dir=(1, 0, 0), z_dir=(0, 1, 0))):
        with Locations((38.5, 4.5)):
            Rectangle(SKETCH_6_W, SKETCH_6_H)
    extrude(amount=-CUT_EXTRUDE_5_DEPTH, mode=Mode.SUBTRACT)

    # 草图7 → 切除-拉伸7 (cut)
    with BuildSketch(Plane(origin=(0, 10, 0), x_dir=(1, 0, 0), z_dir=(0, 1, 0))):
        with Locations((23.85, 5.556514734)):
            Rectangle(SKETCH_7_W, SKETCH_7_H)
    extrude(amount=-CUT_EXTRUDE_7_DEPTH, mode=Mode.SUBTRACT)

    # 草图8 → 切除-拉伸8 (cut)
    with BuildSketch(Plane(origin=(0, 0, -26), x_dir=(-1, 0, 0), z_dir=(0, 0, -1))):
        with Locations((-10, 5)):
            Circle(SKETCH_8_R)
        with Locations((-35, 5)):
            Circle(SKETCH_8_R)
    extrude(amount=-CUT_EXTRUDE_8_DEPTH, mode=Mode.SUBTRACT)

    # 草图10 → 切除-拉伸9 (cut)
    with BuildSketch(Plane(origin=(0, 10, 0), x_dir=(1, 0, 0), z_dir=(0, 1, 0))):
        with Locations((10, 21.5)):
            Rectangle(SKETCH_10_W, SKETCH_10_H)
        with Locations((35, 21.5)):
            Rectangle(SKETCH_10_W, SKETCH_10_H)
    extrude(amount=-CUT_EXTRUDE_9_DEPTH, mode=Mode.SUBTRACT)


solid = part.part
